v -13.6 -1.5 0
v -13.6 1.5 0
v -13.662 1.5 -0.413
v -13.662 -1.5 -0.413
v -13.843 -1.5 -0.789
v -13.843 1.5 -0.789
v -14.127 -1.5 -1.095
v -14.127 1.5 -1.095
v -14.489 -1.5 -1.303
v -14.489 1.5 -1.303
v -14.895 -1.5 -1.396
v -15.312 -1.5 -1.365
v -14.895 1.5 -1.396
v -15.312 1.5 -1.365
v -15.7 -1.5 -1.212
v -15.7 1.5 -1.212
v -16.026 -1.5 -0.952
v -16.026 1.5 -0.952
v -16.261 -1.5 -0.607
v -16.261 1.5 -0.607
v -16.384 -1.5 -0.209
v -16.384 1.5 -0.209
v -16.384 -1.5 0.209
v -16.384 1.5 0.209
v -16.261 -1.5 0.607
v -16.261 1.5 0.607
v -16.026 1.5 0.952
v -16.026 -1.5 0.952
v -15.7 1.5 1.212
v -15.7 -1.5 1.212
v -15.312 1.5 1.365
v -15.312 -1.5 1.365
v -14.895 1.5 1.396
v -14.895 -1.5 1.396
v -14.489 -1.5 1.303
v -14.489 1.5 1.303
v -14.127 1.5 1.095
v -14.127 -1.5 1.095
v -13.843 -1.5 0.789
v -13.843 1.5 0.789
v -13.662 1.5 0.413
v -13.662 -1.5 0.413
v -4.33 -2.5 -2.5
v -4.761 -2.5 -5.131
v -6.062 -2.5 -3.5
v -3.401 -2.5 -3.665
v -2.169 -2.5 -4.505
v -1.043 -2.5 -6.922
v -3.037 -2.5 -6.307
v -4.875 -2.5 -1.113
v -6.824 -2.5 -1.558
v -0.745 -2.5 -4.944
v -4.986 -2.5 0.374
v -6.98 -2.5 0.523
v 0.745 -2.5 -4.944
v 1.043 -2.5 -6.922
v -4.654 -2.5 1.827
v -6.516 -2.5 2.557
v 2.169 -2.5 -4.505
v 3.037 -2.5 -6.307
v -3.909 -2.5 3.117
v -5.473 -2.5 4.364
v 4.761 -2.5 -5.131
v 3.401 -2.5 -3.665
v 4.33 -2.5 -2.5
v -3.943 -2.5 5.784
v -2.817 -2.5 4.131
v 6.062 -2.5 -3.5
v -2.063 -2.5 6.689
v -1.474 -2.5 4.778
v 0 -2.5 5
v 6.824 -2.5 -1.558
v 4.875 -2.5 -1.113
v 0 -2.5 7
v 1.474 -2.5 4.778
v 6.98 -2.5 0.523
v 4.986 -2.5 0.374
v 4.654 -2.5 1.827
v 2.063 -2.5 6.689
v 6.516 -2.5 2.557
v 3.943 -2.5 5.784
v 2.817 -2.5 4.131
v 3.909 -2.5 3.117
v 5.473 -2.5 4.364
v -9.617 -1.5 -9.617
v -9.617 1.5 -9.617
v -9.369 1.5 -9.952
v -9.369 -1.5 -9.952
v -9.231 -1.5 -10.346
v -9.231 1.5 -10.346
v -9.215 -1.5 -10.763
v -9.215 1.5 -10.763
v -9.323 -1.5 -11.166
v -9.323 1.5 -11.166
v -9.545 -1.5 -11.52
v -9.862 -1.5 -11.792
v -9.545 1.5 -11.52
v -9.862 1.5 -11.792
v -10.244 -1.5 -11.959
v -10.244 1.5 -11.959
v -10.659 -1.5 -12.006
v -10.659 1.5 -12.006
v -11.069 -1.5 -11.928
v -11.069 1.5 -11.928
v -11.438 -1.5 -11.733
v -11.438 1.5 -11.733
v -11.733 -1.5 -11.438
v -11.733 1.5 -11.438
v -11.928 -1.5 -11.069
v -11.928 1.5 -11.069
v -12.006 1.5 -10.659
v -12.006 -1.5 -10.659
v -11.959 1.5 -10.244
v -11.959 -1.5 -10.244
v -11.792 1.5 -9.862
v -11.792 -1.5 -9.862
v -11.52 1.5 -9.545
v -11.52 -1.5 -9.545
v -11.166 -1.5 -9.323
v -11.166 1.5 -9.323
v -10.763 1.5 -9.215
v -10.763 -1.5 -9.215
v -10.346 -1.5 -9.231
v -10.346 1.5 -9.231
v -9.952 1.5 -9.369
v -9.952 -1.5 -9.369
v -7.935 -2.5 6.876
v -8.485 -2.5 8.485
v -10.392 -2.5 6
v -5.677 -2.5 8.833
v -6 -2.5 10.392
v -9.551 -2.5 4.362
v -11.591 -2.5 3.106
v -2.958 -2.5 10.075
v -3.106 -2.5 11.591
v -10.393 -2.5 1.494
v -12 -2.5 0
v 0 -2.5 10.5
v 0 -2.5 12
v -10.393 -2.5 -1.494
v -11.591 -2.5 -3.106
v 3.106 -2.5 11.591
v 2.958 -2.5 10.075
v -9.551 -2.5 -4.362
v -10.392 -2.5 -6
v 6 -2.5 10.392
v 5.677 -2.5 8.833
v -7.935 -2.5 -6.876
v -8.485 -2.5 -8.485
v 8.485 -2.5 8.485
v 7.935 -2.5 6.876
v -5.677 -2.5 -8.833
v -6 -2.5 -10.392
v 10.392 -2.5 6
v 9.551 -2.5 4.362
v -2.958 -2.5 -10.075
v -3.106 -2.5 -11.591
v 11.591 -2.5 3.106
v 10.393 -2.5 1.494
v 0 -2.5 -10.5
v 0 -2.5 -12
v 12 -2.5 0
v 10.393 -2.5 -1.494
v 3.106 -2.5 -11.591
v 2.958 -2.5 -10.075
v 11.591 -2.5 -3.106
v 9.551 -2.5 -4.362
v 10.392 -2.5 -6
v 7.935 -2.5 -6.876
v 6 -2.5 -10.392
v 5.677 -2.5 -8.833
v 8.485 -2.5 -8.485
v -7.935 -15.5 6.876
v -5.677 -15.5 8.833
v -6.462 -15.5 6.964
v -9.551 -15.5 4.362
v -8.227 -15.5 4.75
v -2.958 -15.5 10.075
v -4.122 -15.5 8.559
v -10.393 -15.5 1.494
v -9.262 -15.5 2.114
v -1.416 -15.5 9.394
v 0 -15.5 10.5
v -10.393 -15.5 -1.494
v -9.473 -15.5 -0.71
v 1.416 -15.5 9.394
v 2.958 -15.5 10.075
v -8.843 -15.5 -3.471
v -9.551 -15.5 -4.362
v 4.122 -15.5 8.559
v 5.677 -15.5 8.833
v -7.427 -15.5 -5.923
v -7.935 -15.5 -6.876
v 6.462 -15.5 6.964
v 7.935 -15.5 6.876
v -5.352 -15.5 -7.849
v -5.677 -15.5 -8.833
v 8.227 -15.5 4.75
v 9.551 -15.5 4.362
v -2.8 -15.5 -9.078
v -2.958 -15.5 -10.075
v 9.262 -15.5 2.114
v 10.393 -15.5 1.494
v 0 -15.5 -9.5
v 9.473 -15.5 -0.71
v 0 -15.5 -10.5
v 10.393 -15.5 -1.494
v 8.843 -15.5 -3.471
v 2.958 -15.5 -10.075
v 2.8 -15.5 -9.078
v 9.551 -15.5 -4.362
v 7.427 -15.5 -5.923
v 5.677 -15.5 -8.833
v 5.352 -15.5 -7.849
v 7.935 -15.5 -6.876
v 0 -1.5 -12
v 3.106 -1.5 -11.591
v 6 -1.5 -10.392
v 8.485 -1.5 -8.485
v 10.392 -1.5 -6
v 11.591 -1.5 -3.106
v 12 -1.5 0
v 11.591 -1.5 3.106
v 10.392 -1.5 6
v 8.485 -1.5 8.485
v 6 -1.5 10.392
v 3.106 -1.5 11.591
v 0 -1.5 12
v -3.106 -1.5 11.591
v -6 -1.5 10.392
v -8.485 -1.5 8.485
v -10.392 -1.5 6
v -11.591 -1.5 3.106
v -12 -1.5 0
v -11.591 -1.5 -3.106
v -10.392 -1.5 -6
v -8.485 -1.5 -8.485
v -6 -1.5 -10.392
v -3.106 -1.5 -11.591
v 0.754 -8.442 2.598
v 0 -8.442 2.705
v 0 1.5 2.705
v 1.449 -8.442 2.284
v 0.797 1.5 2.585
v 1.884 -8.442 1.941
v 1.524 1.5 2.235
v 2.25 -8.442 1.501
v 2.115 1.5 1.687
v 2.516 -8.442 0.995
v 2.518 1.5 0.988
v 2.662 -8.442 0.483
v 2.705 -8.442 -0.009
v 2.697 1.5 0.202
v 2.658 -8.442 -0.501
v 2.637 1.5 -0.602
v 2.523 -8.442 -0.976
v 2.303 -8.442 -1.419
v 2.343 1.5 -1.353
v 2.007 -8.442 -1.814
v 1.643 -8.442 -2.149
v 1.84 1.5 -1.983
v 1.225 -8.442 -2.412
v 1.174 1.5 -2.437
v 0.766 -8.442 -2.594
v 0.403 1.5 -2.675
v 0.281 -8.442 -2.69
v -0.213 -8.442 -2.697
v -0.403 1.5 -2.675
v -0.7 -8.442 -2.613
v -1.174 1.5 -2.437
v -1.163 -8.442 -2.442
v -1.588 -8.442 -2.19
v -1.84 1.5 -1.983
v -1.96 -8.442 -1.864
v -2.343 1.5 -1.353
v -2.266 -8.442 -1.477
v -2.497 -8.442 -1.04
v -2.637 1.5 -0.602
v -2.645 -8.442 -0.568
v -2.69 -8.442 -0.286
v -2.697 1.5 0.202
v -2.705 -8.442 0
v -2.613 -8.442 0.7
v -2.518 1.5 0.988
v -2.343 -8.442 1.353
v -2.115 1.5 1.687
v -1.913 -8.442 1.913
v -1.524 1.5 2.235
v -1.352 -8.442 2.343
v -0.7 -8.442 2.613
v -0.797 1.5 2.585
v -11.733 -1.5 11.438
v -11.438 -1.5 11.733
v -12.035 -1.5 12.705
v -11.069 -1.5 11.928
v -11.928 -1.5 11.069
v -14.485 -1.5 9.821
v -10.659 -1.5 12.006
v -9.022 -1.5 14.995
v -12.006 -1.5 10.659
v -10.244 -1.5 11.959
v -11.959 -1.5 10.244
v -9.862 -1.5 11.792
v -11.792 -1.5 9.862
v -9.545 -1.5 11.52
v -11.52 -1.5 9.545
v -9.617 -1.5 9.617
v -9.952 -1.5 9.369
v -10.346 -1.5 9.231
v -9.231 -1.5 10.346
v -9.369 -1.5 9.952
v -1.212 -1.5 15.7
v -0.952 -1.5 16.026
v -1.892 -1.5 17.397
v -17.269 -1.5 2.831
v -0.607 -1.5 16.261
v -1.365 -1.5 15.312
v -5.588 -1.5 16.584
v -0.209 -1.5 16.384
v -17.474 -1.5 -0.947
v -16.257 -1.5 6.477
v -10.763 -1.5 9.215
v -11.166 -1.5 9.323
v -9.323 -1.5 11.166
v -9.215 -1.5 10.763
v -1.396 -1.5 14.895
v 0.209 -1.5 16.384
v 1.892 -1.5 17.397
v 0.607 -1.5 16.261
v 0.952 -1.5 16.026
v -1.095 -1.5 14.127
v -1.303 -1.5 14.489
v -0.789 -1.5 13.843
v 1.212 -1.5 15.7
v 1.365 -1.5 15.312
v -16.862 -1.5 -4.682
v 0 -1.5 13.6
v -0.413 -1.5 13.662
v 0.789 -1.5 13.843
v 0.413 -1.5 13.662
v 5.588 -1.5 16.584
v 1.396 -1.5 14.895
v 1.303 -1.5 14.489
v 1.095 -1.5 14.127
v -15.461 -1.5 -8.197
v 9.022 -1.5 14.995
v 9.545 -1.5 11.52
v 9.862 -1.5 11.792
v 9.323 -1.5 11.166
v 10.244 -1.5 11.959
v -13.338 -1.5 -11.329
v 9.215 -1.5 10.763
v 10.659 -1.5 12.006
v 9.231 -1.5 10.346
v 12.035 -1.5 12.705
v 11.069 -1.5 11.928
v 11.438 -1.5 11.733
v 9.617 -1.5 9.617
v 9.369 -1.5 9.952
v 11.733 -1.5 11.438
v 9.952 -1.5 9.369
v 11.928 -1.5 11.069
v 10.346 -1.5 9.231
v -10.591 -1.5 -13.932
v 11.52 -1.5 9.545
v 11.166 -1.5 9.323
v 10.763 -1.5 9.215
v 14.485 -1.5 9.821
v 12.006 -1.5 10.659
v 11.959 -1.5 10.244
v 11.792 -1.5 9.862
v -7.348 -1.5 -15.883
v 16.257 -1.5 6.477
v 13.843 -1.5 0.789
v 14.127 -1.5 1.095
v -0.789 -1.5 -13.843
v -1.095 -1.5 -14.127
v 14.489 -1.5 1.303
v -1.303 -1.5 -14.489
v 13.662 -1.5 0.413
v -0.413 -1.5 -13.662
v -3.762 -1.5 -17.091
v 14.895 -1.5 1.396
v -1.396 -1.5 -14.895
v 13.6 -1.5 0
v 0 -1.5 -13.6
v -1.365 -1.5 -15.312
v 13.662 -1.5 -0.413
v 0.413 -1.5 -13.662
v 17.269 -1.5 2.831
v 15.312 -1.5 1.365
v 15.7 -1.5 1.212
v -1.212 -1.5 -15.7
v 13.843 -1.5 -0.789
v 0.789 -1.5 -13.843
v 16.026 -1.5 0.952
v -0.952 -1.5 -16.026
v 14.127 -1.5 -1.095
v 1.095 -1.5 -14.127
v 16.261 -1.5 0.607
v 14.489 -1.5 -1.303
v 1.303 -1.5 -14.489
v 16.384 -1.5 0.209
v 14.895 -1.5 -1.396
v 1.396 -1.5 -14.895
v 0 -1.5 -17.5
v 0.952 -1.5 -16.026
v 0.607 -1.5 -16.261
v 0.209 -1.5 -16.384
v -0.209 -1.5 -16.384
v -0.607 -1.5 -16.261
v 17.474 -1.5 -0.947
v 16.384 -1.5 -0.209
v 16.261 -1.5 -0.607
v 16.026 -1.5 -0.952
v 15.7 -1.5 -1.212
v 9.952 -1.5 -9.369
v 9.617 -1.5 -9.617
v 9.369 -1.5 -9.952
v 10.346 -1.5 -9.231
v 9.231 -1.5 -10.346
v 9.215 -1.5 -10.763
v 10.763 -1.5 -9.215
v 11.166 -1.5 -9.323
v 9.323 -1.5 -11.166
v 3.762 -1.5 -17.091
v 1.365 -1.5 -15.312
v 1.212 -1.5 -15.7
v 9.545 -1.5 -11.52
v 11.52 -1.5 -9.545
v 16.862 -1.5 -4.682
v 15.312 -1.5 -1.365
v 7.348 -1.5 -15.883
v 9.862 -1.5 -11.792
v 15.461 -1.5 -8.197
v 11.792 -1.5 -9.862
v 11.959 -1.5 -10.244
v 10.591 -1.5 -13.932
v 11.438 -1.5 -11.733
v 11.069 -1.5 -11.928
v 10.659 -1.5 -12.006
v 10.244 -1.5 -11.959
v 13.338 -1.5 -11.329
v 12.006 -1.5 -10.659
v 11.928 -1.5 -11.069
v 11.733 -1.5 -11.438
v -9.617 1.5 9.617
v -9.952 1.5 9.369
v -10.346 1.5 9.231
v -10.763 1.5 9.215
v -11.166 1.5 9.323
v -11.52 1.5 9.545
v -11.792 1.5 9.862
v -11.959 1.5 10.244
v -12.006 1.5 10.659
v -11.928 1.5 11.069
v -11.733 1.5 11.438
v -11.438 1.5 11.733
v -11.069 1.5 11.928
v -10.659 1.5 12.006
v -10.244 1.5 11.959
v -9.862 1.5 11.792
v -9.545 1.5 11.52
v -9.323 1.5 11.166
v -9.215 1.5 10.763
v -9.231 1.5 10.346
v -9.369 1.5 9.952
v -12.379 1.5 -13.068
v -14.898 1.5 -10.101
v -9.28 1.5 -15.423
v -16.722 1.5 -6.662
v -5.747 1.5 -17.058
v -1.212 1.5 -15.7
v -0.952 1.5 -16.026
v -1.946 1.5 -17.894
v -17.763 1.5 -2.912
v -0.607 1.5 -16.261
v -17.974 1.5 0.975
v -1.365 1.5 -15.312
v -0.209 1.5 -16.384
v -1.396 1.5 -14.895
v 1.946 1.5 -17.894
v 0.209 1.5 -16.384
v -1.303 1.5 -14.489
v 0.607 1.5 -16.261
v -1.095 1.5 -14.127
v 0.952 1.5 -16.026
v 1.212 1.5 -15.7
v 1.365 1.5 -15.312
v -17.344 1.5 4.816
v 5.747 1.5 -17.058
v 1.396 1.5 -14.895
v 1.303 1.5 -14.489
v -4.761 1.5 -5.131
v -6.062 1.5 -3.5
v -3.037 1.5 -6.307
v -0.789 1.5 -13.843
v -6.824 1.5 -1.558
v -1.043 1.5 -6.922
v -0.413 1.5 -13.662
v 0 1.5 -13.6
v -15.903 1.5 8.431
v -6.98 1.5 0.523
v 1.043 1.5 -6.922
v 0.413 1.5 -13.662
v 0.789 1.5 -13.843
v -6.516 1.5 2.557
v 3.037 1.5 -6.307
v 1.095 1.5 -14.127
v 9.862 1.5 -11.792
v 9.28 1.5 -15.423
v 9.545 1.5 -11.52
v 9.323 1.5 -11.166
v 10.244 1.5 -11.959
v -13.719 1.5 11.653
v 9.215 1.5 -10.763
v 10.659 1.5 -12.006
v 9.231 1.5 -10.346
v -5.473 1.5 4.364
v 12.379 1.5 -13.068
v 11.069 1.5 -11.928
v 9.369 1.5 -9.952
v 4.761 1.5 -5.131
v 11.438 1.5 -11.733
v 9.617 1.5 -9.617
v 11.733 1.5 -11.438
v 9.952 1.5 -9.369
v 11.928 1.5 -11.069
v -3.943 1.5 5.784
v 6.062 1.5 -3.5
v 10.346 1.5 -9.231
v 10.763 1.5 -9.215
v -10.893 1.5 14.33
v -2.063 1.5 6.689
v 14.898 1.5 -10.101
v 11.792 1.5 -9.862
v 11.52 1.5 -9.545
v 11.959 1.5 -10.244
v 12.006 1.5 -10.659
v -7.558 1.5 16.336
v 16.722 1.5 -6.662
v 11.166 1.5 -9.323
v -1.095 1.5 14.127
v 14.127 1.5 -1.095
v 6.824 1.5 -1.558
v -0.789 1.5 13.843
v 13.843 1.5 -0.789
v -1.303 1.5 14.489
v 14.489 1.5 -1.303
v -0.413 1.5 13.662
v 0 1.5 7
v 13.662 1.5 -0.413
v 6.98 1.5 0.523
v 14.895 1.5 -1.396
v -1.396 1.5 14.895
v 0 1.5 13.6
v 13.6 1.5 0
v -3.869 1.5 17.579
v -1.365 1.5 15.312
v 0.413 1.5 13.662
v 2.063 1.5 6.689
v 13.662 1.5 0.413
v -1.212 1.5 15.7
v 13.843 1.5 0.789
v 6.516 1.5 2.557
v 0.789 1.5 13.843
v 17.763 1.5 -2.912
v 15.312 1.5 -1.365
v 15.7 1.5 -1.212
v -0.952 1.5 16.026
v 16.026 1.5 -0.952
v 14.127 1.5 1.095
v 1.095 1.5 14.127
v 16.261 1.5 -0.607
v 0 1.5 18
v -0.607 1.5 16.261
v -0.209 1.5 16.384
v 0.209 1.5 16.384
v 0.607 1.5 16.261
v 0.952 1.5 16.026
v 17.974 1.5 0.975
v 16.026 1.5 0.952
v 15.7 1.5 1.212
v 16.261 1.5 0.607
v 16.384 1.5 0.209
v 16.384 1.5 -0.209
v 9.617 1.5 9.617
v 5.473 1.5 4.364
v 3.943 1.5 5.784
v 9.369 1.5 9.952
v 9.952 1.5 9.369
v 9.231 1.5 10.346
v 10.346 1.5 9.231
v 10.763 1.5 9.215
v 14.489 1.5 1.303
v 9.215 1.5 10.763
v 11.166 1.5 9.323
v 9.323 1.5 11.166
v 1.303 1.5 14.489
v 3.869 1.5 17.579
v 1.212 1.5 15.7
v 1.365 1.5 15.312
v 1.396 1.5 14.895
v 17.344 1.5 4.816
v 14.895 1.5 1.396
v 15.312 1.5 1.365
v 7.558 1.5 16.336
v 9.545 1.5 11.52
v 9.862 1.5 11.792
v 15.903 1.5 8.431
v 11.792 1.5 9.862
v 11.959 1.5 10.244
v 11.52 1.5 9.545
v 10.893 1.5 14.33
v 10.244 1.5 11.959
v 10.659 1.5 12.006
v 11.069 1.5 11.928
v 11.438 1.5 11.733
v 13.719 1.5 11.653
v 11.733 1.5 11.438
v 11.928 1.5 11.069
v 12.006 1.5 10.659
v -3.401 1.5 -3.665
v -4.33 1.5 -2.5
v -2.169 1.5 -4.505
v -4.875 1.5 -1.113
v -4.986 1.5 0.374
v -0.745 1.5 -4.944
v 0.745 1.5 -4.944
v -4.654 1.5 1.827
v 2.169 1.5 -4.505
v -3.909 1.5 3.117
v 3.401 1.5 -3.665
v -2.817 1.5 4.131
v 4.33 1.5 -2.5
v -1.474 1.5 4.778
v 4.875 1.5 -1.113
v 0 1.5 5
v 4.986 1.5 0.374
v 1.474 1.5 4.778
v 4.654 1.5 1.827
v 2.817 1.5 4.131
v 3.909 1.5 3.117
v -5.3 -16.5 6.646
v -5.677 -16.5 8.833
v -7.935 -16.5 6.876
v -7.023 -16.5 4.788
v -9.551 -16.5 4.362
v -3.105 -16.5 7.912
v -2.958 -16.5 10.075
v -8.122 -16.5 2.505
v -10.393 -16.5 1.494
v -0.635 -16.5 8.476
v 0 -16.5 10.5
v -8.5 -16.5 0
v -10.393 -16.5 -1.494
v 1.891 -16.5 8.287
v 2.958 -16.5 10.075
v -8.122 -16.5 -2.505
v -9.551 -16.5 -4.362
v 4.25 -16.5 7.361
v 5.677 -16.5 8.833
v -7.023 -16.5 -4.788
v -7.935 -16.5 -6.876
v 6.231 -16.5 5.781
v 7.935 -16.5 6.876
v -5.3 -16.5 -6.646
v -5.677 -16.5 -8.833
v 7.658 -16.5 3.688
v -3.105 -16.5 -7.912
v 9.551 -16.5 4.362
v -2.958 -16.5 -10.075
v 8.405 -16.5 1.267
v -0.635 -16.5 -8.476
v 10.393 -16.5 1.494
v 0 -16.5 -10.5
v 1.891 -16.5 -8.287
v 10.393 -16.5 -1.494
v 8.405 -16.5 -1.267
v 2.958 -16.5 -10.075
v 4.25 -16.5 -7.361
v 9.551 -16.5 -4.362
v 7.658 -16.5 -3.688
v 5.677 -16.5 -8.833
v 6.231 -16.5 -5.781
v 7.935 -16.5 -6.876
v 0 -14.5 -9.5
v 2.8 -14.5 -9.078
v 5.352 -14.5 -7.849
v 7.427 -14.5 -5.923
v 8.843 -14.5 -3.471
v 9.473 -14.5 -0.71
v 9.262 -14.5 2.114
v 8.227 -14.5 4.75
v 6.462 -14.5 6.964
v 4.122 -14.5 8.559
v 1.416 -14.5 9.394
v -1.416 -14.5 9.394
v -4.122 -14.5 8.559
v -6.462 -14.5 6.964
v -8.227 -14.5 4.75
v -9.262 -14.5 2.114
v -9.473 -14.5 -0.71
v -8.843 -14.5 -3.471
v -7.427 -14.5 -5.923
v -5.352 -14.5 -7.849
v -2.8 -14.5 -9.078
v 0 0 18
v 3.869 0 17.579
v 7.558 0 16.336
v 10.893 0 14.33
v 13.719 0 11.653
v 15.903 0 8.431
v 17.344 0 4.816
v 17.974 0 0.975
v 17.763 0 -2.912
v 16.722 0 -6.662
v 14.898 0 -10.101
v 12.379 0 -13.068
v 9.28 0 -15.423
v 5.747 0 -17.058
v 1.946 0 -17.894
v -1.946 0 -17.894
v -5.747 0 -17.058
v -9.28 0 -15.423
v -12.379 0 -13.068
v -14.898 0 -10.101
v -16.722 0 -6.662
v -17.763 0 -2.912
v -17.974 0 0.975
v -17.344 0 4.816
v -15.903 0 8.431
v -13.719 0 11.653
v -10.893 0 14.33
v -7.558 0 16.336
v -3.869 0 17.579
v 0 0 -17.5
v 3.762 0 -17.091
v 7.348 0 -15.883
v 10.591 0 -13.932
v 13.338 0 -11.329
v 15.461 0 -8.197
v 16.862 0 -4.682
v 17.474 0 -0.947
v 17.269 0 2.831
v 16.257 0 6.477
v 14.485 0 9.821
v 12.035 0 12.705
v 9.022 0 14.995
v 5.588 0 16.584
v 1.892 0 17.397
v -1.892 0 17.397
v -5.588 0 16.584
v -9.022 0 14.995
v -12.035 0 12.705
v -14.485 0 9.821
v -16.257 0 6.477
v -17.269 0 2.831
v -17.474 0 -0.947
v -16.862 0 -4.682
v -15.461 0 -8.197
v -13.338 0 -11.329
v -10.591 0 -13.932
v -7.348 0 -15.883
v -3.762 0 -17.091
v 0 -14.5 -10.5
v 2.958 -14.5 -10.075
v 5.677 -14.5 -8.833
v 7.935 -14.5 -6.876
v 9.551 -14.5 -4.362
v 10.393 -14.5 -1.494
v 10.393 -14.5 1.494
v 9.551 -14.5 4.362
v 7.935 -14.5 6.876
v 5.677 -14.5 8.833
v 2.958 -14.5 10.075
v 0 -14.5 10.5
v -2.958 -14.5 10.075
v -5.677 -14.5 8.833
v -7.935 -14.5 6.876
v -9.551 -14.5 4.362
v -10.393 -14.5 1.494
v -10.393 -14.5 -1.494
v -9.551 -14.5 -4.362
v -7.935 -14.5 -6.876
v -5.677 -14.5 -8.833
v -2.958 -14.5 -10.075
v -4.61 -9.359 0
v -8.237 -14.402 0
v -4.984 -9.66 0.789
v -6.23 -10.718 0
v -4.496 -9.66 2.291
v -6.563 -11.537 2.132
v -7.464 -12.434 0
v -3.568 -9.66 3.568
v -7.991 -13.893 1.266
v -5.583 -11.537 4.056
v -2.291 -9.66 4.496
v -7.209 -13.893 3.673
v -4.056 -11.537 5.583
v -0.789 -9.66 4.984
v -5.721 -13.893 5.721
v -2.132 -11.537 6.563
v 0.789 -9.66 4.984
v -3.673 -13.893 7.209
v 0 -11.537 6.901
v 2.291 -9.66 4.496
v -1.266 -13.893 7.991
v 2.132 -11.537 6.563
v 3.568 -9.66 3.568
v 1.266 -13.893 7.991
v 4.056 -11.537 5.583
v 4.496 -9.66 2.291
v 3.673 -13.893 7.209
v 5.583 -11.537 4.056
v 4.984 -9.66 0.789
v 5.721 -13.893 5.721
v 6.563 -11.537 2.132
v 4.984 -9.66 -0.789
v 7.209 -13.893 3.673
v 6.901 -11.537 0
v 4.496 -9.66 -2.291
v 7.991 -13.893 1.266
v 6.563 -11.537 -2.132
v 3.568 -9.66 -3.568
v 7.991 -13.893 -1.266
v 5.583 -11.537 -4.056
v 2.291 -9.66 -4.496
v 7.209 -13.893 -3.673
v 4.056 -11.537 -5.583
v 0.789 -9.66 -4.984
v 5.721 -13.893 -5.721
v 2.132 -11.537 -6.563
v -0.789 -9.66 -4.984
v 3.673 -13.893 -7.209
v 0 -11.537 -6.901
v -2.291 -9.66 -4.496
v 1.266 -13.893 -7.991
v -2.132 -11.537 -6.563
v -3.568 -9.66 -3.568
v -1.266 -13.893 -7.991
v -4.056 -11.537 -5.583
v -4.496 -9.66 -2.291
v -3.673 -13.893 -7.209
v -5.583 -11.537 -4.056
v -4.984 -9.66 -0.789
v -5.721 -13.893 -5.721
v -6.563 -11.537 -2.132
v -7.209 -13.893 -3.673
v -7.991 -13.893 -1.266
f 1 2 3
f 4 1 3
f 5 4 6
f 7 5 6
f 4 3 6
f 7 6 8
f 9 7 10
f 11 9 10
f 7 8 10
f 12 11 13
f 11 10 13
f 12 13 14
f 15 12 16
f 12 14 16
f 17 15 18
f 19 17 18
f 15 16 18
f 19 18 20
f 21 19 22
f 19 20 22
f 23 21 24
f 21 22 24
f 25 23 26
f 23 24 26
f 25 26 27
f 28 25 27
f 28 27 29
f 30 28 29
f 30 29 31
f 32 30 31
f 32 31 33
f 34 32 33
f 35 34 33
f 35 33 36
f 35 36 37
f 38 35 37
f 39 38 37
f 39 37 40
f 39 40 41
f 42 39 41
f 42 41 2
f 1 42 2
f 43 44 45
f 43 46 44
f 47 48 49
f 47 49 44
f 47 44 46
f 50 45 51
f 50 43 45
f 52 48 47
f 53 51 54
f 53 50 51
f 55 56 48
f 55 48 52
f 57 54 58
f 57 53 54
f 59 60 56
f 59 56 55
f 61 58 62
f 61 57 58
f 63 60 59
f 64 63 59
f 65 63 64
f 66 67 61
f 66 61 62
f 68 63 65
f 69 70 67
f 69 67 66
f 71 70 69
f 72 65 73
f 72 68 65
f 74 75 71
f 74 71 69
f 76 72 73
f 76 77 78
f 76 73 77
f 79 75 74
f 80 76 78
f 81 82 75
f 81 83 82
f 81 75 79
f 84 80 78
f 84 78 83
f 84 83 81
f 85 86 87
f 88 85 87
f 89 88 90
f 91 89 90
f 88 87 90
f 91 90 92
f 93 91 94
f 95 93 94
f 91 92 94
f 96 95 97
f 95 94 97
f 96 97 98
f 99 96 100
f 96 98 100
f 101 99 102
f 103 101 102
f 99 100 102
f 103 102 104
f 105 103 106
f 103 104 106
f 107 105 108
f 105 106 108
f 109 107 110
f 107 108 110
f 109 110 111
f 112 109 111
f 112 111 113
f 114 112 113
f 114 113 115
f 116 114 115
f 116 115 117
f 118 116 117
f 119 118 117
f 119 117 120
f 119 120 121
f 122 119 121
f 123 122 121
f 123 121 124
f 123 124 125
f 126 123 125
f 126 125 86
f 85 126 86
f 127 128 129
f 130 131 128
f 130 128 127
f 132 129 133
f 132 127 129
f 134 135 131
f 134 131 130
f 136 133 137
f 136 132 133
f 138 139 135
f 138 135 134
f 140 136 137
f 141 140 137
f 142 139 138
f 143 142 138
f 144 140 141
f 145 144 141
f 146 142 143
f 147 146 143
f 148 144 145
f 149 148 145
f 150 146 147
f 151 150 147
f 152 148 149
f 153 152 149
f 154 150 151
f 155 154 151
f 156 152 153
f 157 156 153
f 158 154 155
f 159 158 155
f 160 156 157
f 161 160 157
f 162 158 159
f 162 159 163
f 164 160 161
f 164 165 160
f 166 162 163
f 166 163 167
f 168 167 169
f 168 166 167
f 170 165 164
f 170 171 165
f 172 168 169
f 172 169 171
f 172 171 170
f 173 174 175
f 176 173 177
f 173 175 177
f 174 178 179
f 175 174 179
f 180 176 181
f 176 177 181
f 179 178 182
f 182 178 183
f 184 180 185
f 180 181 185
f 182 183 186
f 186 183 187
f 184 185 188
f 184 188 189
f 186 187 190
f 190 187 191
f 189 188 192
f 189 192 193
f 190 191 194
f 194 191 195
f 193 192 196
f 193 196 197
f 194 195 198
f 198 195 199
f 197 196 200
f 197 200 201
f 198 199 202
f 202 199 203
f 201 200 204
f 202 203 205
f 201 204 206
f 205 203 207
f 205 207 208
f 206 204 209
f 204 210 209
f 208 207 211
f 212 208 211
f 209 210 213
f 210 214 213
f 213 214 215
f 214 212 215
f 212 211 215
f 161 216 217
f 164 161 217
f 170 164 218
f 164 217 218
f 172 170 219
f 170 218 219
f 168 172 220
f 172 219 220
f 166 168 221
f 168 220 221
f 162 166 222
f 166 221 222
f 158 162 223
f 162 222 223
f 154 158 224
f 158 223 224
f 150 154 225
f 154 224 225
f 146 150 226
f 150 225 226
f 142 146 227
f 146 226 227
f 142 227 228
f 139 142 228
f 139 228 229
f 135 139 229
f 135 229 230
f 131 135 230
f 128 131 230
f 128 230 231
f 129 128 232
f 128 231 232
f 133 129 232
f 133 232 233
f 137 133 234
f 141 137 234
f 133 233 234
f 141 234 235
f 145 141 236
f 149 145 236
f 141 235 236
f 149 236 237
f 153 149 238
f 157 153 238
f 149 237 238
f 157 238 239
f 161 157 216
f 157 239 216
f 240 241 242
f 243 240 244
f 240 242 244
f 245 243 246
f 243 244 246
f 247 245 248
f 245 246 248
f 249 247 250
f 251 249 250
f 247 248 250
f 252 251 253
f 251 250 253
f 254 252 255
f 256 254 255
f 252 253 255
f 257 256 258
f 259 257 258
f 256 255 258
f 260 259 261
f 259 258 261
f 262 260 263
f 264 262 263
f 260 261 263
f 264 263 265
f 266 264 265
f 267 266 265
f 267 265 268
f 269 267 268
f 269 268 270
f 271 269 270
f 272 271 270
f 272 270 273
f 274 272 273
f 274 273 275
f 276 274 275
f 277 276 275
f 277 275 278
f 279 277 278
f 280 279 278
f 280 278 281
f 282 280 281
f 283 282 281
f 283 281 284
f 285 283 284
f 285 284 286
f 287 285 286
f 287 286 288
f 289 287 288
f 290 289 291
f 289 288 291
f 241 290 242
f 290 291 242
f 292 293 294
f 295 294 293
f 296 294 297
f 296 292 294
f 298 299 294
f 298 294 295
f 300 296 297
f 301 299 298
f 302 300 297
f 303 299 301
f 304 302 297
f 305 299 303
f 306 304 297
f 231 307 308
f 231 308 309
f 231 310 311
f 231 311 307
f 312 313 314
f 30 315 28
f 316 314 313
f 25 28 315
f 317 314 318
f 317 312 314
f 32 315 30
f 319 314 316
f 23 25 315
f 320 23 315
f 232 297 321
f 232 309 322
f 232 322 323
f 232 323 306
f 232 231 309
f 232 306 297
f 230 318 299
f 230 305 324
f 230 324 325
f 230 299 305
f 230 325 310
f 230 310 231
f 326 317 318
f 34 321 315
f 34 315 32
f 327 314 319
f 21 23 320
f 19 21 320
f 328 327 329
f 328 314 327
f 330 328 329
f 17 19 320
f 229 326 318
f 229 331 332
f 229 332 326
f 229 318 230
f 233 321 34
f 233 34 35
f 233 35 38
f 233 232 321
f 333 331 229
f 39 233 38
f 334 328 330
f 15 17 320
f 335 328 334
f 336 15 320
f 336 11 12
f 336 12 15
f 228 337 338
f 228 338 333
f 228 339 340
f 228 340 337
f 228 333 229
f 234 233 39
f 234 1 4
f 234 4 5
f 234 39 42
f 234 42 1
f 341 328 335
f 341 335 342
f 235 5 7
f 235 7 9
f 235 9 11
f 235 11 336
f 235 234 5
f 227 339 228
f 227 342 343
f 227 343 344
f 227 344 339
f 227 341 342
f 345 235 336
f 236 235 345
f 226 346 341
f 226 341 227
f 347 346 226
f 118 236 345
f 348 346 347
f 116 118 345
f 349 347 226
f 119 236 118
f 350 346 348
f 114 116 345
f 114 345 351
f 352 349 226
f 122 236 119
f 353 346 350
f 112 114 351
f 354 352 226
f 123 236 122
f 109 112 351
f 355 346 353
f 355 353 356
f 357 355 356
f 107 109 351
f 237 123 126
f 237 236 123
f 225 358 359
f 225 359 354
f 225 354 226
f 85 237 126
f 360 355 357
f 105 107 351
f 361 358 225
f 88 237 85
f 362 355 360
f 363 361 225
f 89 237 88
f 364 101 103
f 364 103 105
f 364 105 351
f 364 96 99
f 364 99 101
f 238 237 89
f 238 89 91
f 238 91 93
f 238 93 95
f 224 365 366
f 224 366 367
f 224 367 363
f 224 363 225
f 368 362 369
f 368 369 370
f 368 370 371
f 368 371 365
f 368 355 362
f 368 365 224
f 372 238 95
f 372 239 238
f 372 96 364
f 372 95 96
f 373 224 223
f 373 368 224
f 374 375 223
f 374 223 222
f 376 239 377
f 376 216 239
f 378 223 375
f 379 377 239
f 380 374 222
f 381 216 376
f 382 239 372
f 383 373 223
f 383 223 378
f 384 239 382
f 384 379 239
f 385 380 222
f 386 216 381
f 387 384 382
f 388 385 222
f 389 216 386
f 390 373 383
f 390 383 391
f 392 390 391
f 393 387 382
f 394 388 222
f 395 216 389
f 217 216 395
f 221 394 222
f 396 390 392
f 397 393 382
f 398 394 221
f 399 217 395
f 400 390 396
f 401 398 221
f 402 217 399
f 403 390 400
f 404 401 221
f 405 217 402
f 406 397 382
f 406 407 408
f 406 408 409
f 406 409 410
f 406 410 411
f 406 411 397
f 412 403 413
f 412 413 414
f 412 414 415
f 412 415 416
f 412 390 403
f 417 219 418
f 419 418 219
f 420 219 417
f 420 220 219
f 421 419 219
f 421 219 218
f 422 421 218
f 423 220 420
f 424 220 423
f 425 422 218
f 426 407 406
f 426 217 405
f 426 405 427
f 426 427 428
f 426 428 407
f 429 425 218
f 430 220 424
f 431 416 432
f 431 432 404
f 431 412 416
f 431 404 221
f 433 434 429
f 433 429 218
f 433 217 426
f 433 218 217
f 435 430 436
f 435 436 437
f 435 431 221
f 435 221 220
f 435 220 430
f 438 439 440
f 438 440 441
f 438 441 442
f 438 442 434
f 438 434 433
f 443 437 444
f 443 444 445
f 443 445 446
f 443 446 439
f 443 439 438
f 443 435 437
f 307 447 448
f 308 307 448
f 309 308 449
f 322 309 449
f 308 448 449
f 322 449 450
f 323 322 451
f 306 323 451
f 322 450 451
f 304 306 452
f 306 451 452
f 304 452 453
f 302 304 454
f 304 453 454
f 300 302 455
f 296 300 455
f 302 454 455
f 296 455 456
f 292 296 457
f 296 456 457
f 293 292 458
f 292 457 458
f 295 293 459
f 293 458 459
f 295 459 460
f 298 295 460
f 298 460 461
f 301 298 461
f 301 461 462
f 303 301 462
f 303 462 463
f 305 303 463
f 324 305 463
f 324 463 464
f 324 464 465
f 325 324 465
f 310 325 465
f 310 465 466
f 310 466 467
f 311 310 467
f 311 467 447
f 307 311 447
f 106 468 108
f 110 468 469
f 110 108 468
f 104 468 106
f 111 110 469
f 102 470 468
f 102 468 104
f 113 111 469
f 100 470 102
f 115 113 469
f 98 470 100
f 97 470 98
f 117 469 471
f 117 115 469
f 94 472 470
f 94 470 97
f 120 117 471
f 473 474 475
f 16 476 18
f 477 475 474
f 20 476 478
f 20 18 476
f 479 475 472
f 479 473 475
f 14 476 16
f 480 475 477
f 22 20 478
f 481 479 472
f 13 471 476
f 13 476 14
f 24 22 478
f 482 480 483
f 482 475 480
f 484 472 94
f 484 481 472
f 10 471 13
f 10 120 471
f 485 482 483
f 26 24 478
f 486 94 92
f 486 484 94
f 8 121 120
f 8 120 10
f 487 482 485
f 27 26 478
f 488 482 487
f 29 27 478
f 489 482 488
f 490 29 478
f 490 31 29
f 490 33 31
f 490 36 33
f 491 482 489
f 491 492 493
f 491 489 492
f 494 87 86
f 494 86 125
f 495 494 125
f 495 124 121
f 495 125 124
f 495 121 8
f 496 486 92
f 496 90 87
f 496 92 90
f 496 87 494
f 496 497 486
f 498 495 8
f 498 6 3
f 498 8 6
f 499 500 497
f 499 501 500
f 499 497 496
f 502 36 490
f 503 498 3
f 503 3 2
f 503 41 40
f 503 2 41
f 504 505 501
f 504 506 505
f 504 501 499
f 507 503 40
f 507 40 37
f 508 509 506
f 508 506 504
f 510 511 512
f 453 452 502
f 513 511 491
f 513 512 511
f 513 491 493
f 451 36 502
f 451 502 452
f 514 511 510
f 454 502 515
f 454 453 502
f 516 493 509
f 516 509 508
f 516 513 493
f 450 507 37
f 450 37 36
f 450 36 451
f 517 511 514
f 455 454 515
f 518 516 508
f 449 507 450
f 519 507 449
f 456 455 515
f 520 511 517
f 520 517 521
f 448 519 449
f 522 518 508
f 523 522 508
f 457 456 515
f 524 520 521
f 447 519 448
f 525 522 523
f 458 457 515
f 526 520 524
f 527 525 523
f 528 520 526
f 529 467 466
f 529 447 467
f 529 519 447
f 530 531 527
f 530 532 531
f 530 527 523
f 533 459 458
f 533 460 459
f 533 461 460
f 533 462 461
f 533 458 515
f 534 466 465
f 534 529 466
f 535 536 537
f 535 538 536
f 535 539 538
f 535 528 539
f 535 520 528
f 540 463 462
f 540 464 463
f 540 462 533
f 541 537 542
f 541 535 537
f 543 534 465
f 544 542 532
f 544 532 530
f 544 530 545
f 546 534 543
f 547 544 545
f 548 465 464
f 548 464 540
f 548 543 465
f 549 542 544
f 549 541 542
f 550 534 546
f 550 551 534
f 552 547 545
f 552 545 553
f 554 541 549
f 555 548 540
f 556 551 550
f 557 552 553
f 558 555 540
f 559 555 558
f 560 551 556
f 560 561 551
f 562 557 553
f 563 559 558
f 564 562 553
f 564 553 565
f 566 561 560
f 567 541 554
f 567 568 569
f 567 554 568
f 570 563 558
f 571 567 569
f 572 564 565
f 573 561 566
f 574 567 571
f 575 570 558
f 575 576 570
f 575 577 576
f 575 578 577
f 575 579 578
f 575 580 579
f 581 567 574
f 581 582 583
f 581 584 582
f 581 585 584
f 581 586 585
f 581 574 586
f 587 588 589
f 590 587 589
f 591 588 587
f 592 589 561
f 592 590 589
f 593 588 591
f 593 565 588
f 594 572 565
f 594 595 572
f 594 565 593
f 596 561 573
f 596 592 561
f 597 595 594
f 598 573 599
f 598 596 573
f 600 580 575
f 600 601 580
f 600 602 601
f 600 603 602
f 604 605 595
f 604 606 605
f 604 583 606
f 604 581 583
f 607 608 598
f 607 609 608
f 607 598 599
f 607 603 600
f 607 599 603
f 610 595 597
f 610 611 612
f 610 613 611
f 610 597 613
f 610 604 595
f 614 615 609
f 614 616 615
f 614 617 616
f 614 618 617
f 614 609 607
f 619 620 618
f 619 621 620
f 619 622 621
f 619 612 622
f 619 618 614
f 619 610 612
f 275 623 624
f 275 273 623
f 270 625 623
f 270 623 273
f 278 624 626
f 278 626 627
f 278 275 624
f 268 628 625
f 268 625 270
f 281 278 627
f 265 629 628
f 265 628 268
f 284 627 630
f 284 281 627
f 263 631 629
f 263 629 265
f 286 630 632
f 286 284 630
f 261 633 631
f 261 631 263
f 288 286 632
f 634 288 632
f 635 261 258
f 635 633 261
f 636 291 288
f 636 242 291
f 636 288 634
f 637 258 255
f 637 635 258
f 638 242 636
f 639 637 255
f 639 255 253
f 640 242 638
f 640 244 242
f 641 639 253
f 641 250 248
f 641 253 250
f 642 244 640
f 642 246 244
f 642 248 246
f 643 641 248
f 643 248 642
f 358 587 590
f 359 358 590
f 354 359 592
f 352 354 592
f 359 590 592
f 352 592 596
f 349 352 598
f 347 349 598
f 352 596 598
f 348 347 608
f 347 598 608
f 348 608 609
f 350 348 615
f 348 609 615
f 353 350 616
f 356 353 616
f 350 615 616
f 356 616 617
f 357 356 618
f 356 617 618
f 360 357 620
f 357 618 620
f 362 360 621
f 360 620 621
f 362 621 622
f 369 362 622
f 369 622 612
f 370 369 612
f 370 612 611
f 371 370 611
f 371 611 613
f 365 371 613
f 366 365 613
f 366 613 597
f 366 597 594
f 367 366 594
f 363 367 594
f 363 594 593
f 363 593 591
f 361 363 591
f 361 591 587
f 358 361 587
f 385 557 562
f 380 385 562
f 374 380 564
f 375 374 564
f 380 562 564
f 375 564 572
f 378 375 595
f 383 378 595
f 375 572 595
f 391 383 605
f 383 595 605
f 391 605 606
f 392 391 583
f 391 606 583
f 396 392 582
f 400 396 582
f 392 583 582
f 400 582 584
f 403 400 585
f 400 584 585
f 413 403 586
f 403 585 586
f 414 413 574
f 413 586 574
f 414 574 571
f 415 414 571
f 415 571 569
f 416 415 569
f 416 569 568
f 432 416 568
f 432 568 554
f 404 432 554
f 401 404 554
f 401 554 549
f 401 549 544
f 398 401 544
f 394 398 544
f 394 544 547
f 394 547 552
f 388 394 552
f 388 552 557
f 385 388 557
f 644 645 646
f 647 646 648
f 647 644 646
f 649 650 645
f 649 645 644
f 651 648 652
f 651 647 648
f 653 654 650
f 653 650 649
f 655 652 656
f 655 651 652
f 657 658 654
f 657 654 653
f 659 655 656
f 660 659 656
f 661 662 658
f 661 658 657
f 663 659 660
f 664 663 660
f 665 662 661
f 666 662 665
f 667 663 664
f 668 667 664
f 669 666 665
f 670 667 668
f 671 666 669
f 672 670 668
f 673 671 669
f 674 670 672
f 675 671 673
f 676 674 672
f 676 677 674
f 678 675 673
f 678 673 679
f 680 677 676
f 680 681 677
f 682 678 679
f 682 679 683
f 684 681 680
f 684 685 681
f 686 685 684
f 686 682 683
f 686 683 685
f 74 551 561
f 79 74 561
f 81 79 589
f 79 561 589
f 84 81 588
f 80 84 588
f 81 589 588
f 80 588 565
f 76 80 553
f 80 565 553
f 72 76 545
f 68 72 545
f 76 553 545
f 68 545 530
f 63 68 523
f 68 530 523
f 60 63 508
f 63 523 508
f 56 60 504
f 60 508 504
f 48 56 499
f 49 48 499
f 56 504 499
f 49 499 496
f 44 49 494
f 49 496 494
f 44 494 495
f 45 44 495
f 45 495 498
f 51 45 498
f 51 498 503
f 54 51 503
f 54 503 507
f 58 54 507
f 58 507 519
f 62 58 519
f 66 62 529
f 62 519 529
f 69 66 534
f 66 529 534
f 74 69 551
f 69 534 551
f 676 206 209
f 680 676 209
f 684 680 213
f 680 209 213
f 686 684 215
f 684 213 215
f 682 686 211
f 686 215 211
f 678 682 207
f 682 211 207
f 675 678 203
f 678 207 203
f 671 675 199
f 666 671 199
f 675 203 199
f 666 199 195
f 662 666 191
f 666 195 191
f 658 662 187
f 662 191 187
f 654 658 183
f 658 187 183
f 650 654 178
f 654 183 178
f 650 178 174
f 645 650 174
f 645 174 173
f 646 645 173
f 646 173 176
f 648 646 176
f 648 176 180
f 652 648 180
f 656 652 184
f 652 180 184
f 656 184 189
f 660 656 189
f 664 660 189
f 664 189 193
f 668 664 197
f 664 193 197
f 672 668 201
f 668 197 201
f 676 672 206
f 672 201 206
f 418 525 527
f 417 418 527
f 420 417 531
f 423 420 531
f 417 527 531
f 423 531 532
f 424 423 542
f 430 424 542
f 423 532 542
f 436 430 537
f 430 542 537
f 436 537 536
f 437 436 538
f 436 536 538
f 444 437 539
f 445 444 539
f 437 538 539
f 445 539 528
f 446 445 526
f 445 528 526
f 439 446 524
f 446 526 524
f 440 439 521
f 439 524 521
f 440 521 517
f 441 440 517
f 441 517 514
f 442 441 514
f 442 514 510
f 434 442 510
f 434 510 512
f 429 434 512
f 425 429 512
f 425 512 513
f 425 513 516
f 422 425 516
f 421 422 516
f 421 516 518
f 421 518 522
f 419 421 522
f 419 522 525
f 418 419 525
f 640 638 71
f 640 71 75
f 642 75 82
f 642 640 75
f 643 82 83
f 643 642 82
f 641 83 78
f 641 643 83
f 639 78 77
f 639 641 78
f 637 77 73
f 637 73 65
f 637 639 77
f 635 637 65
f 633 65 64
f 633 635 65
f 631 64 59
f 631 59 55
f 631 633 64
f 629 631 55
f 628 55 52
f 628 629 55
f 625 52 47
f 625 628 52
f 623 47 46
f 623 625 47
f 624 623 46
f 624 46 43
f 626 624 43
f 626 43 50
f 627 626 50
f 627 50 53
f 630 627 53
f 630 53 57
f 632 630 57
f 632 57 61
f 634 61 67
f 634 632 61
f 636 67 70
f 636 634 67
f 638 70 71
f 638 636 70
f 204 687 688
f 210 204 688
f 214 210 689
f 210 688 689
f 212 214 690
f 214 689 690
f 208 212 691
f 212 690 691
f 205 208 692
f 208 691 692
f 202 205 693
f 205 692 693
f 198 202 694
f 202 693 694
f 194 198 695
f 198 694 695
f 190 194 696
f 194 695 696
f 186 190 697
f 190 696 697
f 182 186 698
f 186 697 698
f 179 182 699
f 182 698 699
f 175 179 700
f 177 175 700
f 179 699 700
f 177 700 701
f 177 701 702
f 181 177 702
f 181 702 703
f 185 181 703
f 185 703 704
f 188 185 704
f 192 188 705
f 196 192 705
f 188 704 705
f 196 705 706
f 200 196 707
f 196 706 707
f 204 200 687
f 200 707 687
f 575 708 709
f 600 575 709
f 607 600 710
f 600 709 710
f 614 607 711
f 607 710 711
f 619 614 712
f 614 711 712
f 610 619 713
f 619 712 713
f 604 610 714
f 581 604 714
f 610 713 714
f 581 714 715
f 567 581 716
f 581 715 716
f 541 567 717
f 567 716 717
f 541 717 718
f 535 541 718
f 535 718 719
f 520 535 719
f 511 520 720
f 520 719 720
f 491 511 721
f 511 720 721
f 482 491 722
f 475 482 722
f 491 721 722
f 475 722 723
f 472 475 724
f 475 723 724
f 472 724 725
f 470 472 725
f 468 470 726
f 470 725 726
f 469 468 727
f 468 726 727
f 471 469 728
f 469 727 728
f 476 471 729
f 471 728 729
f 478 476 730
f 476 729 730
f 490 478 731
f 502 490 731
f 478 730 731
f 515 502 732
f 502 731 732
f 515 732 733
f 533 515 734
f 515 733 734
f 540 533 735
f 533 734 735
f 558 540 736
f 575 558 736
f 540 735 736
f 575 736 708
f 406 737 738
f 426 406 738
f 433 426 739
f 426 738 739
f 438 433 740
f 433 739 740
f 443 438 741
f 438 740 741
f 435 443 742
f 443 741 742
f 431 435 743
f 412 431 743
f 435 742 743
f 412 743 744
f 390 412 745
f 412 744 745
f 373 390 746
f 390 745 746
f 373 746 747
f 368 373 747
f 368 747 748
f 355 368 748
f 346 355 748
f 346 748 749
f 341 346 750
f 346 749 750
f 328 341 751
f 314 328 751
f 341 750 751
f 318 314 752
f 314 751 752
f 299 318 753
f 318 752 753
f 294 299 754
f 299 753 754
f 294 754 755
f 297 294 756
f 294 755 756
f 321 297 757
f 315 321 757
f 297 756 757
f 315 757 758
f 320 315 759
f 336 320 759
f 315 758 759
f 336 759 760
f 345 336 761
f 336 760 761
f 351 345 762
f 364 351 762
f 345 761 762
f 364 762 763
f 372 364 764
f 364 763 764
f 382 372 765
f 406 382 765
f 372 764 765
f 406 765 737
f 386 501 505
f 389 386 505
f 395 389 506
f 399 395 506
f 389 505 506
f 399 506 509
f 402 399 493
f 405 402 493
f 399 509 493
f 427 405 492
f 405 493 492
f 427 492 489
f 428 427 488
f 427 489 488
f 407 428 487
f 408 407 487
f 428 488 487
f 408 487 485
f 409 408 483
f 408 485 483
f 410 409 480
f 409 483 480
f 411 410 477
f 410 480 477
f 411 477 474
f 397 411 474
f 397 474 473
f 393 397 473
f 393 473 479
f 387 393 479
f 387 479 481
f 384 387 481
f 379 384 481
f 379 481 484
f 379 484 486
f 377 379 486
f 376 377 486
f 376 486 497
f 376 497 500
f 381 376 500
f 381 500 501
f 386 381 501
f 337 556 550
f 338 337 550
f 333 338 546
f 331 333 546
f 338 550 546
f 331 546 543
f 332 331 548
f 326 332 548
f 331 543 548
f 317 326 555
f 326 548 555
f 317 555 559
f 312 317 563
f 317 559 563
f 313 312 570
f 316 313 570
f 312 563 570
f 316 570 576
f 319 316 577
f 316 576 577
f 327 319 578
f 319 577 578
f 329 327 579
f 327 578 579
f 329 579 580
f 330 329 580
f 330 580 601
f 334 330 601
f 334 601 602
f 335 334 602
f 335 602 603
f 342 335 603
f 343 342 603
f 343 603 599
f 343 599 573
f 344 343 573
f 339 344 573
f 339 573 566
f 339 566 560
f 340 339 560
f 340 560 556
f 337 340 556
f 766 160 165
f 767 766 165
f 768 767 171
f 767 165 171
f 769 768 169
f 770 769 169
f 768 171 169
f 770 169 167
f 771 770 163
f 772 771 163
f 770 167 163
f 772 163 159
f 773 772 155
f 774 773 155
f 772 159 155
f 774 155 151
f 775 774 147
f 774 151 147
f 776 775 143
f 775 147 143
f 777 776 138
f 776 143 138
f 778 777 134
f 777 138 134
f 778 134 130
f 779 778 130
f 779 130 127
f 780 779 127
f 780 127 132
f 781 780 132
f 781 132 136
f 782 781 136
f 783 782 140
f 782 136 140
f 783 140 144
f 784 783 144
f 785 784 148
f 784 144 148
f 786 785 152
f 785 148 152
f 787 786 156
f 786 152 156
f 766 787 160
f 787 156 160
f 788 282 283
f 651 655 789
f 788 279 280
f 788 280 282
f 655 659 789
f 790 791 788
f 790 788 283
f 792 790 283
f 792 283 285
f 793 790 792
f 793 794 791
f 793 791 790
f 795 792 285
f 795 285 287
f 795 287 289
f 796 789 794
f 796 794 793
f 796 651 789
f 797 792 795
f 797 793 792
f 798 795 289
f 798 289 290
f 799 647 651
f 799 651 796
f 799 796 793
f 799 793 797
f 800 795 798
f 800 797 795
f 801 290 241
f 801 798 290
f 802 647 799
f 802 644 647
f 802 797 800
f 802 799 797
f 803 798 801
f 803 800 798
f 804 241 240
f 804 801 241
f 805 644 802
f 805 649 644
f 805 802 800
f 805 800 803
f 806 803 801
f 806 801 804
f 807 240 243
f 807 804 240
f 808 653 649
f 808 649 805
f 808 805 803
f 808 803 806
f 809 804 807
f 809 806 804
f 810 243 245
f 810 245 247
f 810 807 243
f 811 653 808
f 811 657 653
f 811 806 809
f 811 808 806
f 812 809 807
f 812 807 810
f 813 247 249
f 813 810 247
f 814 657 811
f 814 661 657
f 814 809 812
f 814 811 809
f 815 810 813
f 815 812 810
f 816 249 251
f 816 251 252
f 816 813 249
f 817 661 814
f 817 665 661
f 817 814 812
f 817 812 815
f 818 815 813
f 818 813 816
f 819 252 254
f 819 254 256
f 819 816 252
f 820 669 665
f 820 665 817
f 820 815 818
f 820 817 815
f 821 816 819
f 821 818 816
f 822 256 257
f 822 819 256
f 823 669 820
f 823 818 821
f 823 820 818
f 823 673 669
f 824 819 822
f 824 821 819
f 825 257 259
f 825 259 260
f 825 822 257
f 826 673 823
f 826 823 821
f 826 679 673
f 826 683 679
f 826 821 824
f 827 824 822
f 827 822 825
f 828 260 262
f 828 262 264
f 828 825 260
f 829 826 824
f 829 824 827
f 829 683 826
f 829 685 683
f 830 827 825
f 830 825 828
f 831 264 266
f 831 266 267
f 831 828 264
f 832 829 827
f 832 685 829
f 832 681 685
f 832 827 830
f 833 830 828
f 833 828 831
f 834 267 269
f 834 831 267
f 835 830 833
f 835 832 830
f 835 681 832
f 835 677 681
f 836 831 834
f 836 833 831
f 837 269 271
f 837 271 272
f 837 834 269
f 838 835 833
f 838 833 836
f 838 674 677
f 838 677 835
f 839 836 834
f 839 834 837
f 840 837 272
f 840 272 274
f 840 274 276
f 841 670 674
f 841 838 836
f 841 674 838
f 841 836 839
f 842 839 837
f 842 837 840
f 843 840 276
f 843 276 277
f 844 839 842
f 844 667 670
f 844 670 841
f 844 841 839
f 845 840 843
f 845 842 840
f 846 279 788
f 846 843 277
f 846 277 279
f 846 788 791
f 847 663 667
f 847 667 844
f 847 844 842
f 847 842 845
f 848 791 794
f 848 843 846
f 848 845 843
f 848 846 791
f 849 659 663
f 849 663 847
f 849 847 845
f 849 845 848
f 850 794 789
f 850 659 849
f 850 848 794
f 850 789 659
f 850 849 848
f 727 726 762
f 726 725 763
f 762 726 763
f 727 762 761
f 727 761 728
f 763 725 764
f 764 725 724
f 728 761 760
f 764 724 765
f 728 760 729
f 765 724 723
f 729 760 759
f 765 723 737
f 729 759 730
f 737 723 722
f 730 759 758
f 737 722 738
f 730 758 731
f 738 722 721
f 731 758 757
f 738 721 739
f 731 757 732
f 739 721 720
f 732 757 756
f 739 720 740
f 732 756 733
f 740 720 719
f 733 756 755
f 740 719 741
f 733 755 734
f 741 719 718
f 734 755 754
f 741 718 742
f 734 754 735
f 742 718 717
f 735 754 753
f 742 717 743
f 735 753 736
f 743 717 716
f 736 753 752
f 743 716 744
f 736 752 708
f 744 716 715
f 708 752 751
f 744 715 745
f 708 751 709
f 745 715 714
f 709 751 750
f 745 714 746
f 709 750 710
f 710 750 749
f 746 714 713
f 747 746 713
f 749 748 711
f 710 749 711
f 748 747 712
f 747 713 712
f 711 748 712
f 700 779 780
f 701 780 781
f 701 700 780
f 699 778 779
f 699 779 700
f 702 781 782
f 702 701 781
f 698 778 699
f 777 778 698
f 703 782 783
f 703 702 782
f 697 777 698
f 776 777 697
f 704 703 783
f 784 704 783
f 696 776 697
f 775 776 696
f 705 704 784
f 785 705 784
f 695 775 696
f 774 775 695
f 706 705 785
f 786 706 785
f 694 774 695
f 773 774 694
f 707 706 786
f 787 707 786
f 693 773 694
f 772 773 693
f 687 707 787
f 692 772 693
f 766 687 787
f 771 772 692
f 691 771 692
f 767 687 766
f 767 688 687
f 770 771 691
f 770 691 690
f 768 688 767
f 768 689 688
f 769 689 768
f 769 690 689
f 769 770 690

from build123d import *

# Parameters (mm, degrees)
SKETCH1_R           = 18
BOSS_EXTRUDE1_DEPTH = 1.5
SKETCH2_R           = 17.5
BOSS_EXTRUDE2_DEPTH = 1.5
SKETCH3_R           = 12
BOSS_EXTRUDE3_DEPTH = 1
SKETCH4_R           = 10.5
BOSS_EXTRUDE4_DEPTH = 12
SKETCH5_R           = 9.5
BOSS_EXTRUDE5_DEPTH = 1
SKETCH6_R           = 10.5
BOSS_EXTRUDE6_DEPTH = 1
SKETCH8_R           = 2.705
CUT_EXTRUDE1_DEPTH  = 32.176914536
SKETCH9_R           = 7
SKETCH9_R_2         = 5
CUT_EXTRUDE3_DEPTH  = 4
SKETCH10_R          = 1.4
CUT_EXTRUDE4_DEPTH  = 5
CIRPATTERN1_COUNT   = 8


with BuildPart() as part:
    # Sketch1 → Boss-Extrude1 (new body)
    with BuildSketch(Plane(origin=(0, 0, 0), x_dir=(1, 0, 0), z_dir=(0, 1, 0))):
        with Locations(Location((0, 0, 0), (0, 0, 270))):
            Circle(SKETCH1_R)
    extrude(amount=BOSS_EXTRUDE1_DEPTH)

    # Sketch2 → Boss-Extrude2 (add)
    with BuildSketch(Plane.XZ):
        with Locations(Location((0, 0, 0), (0, 0, 270))):
            Circle(SKETCH2_R)
    extrude(amount=BOSS_EXTRUDE2_DEPTH)

    # Sketch3 → Boss-Extrude3 (add)
    with BuildSketch(Plane.XZ.offset(1.5)):
        with Locations(Location((0, 0, 0), (0, 0, 270))):
            Circle(SKETCH3_R)
    extrude(amount=BOSS_EXTRUDE3_DEPTH)

    # Sketch4 → Boss-Extrude4 (add)
    with BuildSketch(Plane.XZ.offset(2.5)):
        with Locations(Location((0, 0, 0), (0, 0, 270))):
            Circle(SKETCH4_R)
    extrude(amount=BOSS_EXTRUDE4_DEPTH)

    # Sketch5 → Boss-Extrude5 (add)
    with BuildSketch(Plane.XZ.offset(14.5)):
        with Locations(Location((0, 0, 0), (0, 0, 270))):
            Circle(SKETCH5_R)
    extrude(amount=BOSS_EXTRUDE5_DEPTH)

    # Sketch6 → Boss-Extrude6 (add)
    with BuildSketch(Plane.XZ.offset(15.5)):
        with Locations(Location((0, 0, 0), (0, 0, 270))):
            Circle(SKETCH6_R)
    extrude(amount=BOSS_EXTRUDE6_DEPTH)

    # Sketch7 → Cut-Revolve1 (revolve, cut)
    with BuildSketch(Plane.XY):
        with BuildLine():
            Line((-8.5, -16.5), (0, -16.5))
            Line((0, -16.5), (0, -8))
            ThreePointArc((0, -8), (-6.01040764, -10.48959236), (-8.5, -16.5))
        make_face()
    revolve(axis=Axis((0, -16.5, 0), (0, 1, 0)), mode=Mode.SUBTRACT)

    # Sketch8 → Cut-Extrude1 (cut, through all)
    with BuildSketch(Plane(origin=(0, 1.5, 0), x_dir=(1, 0, 0), z_dir=(0, 1, 0))):
        with Locations(Location((0, 0, 0), (0, 0, 270))):
            Circle(SKETCH8_R)
    extrude(amount=-CUT_EXTRUDE1_DEPTH, mode=Mode.SUBTRACT)

    # Sketch9 → Cut-Extrude3 (cut)
    with BuildSketch(Plane(origin=(0, 1.5, 0), x_dir=(1, 0, 0), z_dir=(0, 1, 0))):
        with Locations(Location((0, 0, 0), (0, 0, 270))):
            Circle(SKETCH9_R)
        with Locations(Location((0, 0, 0), (0, 0, 270))):
            Circle(SKETCH9_R_2, mode=Mode.SUBTRACT)
    extrude(amount=-CUT_EXTRUDE3_DEPTH, mode=Mode.SUBTRACT)

    # Sketch10 → Cut-Extrude4 (cut)
    with BuildSketch(Plane(origin=(0, 1.5, 0), x_dir=(1, 0, 0), z_dir=(0, 1, 0))):
        with Locations(Location((0, 15, 0), (0, 0, 270))):
            Circle(SKETCH10_R)
    cut_extrude4 = extrude(amount=-CUT_EXTRUDE4_DEPTH, mode=Mode.SUBTRACT)

    # CirPattern1: Cut-Extrude4 ×8 about axis
    cirpattern1_axis = Axis((0, 0, 0), (0, 1, 0))
    for i in range(1, CIRPATTERN1_COUNT):
        add(cut_extrude4.rotate(cirpattern1_axis, i * 360 / CIRPATTERN1_COUNT), mode=Mode.SUBTRACT)


solid = part.part
